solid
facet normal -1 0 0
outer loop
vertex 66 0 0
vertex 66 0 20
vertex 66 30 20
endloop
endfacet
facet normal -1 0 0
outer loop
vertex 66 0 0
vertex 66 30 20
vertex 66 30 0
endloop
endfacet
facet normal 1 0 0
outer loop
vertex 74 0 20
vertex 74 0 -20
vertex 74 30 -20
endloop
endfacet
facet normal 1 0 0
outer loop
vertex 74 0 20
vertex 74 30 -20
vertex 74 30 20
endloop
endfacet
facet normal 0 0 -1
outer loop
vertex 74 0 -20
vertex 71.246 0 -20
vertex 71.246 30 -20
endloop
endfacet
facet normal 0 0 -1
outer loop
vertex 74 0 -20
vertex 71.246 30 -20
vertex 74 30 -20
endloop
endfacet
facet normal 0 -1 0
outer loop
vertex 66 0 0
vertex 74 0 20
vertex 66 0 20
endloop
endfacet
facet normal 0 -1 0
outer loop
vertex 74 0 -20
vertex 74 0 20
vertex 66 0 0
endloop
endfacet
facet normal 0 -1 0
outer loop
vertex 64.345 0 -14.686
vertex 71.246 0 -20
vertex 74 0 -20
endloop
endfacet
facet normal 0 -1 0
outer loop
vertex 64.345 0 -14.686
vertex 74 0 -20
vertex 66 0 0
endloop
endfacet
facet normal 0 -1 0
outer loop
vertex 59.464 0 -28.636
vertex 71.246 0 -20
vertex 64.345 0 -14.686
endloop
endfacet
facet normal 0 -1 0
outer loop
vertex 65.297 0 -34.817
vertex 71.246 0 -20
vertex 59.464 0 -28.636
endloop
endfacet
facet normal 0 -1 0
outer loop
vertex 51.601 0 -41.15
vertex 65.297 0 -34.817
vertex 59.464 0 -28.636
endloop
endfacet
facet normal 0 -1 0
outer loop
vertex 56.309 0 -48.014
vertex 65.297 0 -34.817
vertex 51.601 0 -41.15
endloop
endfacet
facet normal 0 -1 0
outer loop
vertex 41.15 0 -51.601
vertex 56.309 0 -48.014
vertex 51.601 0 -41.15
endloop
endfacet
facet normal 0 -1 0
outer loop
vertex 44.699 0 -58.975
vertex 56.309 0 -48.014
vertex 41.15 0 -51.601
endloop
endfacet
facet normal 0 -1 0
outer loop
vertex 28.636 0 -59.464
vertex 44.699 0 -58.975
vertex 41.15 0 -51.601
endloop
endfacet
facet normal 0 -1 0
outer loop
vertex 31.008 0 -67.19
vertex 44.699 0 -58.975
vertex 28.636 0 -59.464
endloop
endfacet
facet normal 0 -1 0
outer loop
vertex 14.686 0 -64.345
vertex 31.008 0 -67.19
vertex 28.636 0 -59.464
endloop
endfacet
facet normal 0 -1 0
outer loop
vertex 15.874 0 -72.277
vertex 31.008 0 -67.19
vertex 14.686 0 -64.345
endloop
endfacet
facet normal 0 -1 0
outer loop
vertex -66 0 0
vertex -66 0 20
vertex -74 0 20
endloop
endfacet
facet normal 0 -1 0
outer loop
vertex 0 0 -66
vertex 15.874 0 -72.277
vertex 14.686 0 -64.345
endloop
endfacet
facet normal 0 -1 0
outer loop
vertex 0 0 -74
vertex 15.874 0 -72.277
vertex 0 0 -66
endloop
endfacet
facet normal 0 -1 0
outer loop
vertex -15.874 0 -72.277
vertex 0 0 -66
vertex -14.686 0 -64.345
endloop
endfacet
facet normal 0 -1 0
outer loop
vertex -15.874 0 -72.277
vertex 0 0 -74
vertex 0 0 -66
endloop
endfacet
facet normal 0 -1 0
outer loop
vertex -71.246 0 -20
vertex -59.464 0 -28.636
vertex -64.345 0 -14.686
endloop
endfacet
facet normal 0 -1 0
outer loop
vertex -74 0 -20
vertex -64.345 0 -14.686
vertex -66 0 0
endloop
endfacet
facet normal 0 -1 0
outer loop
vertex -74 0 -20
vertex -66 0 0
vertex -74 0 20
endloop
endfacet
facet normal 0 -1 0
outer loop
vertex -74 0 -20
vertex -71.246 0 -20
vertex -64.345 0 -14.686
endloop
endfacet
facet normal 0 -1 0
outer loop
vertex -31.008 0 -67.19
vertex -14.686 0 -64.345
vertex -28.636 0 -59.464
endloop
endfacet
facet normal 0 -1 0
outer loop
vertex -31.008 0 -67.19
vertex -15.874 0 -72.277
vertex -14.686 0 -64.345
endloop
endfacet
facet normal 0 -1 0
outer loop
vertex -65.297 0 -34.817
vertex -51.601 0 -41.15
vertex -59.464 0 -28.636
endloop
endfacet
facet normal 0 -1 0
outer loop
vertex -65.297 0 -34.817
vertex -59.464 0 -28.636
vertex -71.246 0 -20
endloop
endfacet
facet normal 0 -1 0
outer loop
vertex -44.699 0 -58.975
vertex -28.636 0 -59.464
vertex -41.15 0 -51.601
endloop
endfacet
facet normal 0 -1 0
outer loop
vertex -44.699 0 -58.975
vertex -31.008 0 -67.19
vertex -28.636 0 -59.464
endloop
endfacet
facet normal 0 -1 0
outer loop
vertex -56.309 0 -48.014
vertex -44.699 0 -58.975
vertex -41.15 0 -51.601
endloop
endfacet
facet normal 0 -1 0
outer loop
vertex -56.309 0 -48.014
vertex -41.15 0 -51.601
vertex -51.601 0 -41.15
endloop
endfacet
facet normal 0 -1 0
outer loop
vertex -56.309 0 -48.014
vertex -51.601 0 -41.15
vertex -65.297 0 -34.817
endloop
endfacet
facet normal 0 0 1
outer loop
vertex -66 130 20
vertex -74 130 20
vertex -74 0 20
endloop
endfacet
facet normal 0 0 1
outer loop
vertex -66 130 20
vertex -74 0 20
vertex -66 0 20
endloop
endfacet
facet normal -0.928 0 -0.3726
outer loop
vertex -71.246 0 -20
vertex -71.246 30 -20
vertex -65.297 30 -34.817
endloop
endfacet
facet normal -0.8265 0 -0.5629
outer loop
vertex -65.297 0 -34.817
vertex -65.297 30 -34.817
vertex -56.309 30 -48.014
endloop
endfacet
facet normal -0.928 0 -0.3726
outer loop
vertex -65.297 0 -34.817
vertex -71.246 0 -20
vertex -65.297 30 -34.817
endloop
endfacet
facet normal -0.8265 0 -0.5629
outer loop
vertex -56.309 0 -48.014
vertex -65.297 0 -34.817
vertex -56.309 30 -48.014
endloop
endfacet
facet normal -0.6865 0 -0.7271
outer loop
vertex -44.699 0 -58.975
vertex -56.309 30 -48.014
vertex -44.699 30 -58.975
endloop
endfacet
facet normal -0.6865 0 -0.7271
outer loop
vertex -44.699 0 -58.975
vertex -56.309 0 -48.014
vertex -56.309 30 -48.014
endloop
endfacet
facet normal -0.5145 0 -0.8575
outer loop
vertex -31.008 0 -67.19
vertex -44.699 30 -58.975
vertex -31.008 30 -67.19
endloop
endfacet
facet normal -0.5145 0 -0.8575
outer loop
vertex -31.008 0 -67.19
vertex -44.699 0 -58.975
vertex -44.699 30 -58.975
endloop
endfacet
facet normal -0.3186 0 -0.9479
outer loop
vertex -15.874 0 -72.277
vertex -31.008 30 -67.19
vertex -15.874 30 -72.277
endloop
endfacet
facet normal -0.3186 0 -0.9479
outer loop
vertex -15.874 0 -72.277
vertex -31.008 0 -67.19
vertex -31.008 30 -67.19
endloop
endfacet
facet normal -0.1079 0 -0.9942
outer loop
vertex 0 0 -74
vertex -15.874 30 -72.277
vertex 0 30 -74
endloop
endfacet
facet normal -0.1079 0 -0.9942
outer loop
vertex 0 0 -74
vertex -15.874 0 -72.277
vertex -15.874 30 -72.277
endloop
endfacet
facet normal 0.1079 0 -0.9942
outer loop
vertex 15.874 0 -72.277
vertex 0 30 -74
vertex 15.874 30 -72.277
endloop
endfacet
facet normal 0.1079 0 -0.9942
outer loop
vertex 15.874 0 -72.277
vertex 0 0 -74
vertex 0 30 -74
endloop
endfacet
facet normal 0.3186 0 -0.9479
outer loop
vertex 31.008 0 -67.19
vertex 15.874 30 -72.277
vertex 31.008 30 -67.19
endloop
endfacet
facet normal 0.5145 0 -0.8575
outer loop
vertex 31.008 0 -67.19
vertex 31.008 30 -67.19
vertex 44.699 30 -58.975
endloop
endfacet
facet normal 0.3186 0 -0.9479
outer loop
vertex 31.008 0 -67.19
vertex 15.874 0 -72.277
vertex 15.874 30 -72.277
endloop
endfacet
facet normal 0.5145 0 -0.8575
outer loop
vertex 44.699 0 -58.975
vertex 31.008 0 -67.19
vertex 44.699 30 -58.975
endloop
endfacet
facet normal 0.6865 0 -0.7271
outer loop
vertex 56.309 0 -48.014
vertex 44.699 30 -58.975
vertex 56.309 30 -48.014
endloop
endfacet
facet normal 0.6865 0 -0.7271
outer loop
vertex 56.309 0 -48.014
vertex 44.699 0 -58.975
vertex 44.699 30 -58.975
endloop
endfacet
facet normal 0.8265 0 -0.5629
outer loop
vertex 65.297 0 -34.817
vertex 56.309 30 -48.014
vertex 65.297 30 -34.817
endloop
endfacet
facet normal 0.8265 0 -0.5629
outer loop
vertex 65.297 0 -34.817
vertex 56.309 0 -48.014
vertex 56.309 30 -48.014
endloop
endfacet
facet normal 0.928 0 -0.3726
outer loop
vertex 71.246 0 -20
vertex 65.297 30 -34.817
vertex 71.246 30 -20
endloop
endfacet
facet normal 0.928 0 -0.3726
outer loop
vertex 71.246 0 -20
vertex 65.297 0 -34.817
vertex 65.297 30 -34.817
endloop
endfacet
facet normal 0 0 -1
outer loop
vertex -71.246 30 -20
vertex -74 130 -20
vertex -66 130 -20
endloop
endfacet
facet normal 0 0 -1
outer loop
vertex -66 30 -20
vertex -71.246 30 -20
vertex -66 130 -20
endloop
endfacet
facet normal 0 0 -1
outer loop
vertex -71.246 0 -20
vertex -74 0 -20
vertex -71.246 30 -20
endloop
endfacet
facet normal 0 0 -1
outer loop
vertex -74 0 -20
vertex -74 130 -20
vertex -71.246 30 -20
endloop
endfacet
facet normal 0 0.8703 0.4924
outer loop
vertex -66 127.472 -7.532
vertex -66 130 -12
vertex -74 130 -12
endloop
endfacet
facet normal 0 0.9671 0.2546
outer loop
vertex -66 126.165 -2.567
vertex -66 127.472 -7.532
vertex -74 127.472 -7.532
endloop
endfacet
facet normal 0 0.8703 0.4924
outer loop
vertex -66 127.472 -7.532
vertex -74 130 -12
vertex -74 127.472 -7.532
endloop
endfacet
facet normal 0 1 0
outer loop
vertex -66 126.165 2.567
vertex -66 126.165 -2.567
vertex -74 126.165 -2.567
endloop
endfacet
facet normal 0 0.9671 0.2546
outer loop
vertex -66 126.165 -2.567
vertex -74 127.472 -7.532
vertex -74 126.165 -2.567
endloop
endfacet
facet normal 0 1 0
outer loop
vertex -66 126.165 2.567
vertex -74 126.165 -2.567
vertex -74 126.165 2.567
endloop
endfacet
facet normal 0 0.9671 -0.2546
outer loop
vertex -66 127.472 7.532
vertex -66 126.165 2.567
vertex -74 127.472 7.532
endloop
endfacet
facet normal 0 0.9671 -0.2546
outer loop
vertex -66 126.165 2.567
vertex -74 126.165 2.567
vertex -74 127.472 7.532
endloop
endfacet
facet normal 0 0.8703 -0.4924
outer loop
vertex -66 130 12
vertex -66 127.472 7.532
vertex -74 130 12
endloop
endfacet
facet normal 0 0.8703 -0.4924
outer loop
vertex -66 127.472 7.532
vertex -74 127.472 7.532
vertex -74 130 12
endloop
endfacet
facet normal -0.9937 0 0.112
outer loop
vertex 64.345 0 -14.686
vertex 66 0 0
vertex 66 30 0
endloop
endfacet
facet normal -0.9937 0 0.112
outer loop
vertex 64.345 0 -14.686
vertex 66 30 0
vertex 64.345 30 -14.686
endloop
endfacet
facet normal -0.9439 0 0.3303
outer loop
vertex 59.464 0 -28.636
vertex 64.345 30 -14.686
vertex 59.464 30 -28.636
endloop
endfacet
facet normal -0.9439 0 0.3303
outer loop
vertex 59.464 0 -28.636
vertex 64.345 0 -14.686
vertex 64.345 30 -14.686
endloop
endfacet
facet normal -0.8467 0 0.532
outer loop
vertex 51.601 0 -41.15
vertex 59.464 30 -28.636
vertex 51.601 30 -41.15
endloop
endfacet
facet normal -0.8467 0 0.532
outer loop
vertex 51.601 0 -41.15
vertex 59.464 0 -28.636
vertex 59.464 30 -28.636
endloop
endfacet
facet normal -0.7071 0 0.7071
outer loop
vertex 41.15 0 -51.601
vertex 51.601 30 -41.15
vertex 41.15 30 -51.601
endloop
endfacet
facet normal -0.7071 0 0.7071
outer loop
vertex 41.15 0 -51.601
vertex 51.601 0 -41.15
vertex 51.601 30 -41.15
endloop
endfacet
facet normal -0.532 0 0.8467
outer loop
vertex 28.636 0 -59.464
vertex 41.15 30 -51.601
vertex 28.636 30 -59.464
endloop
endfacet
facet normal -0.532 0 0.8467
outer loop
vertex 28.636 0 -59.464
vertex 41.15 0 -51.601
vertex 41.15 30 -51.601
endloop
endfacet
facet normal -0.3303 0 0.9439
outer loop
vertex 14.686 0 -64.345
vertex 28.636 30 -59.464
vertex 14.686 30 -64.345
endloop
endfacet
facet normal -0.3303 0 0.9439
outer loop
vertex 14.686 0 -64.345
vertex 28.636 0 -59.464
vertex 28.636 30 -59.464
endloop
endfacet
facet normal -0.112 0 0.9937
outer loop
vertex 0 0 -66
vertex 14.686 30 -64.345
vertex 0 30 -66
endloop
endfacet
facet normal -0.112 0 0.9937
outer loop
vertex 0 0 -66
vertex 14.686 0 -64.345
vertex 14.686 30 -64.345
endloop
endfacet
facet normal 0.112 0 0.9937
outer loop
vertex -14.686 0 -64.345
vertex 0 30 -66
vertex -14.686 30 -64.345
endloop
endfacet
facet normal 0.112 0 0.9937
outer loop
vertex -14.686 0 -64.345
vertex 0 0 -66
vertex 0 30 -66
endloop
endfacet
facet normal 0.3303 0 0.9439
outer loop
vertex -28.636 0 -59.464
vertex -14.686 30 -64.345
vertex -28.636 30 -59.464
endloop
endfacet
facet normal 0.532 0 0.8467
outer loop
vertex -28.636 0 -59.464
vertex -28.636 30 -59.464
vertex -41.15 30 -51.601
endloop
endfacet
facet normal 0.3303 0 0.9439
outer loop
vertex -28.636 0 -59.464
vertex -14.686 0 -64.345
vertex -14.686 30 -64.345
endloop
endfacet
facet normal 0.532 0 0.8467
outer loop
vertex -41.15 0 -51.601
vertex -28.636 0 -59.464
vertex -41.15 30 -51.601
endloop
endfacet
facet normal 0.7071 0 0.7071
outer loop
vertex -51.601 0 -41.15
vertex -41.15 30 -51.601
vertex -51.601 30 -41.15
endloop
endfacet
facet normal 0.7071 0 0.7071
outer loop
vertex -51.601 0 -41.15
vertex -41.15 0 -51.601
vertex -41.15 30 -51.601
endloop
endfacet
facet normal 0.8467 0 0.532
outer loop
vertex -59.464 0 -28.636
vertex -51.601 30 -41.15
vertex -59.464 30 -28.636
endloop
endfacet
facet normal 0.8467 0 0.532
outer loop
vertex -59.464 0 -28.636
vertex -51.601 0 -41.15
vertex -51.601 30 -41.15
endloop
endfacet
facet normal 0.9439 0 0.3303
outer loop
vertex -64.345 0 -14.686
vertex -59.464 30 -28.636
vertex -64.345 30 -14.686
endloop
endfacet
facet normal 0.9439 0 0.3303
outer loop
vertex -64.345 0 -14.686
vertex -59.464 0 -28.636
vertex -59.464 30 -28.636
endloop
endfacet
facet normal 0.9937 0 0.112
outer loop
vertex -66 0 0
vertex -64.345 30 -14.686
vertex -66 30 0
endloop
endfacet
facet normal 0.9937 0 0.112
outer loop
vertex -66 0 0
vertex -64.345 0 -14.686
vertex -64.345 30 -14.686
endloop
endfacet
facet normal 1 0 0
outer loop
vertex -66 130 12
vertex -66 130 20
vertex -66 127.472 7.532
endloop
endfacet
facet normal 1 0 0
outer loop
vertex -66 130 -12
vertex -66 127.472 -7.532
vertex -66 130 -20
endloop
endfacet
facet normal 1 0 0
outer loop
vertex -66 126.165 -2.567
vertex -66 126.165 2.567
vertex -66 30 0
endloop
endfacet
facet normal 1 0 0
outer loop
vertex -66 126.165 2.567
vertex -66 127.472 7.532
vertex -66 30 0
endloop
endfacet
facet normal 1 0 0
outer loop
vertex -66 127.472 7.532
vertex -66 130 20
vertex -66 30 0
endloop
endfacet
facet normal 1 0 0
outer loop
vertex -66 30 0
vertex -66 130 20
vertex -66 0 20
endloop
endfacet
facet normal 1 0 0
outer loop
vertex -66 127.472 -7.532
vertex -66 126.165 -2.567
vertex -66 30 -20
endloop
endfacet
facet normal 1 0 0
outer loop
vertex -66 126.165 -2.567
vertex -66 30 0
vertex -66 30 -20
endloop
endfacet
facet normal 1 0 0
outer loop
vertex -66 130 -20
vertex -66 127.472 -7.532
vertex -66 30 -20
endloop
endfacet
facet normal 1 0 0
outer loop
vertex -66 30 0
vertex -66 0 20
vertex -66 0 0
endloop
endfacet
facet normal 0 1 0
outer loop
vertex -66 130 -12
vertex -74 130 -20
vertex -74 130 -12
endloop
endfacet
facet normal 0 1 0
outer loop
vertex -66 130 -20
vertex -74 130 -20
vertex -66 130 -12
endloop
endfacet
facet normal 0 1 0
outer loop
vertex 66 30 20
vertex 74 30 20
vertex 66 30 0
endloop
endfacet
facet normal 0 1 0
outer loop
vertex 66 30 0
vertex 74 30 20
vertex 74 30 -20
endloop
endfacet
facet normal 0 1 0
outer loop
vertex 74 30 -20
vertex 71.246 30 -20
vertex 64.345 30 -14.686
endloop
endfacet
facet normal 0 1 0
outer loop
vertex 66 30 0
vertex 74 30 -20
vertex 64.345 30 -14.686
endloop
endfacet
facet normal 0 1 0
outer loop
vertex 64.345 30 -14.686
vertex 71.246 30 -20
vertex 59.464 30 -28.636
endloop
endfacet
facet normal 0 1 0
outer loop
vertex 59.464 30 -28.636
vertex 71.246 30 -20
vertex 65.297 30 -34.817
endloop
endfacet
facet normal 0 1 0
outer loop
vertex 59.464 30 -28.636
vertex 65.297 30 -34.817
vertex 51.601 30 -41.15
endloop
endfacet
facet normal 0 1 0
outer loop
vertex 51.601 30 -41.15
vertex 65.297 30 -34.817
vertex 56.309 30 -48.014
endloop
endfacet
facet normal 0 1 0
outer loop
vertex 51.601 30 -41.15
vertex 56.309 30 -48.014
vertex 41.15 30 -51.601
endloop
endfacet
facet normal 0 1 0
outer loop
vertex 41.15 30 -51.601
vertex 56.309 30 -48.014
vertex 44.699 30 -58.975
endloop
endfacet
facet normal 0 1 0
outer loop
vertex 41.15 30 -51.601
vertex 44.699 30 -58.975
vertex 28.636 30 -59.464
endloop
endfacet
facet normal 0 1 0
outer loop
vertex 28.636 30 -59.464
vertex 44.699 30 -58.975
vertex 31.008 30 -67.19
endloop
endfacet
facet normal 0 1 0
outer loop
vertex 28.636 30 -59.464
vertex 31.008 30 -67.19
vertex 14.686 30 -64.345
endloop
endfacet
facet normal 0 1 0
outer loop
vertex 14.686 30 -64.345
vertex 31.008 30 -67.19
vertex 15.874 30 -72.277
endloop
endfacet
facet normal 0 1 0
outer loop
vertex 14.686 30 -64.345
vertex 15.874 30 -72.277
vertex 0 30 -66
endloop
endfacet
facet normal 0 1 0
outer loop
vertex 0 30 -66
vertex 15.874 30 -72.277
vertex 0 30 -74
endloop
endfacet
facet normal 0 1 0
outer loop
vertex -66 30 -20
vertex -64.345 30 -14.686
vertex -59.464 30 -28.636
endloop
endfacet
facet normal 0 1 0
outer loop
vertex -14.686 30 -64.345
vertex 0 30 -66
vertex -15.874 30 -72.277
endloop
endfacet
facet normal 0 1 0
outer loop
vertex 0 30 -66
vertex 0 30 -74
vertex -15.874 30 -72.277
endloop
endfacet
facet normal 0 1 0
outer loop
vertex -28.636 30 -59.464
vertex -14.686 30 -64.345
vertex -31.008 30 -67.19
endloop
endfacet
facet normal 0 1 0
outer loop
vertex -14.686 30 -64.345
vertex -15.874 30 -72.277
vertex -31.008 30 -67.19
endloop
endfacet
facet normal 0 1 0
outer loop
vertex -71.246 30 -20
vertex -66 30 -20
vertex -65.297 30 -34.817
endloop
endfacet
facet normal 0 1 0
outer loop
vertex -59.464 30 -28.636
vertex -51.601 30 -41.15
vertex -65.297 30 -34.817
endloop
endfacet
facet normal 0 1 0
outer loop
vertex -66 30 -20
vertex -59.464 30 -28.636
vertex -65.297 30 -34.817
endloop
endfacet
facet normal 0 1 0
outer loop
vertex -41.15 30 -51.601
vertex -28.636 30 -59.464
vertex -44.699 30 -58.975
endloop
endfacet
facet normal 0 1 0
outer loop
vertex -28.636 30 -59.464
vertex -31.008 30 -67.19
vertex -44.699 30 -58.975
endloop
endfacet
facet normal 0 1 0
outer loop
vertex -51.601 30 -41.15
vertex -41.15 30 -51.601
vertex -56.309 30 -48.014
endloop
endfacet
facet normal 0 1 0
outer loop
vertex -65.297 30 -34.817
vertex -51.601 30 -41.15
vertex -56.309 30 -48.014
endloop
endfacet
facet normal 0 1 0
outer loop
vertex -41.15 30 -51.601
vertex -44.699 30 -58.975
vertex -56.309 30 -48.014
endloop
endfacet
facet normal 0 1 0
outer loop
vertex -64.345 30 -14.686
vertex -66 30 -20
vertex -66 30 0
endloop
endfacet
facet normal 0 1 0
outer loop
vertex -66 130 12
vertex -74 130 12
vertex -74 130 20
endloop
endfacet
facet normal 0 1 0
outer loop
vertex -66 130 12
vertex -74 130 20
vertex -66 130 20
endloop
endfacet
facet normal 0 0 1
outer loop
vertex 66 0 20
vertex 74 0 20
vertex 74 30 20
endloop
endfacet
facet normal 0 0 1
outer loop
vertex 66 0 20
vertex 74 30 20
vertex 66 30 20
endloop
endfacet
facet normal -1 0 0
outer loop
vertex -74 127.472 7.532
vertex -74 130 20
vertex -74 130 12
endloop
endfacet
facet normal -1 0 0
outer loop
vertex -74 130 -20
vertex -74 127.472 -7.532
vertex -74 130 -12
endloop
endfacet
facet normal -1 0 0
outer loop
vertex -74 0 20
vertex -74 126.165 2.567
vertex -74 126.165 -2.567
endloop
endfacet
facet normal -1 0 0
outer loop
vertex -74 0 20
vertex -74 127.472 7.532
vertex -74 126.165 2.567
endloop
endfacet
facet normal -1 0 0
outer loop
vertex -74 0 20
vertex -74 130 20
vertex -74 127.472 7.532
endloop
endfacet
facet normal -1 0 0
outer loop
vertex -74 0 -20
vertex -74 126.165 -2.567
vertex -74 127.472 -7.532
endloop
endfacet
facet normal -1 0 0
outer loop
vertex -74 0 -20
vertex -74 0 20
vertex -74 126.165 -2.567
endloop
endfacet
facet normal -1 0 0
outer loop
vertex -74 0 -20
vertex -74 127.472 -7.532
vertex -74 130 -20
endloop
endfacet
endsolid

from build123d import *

# Parameters (mm, degrees)
EXTRUDE_1_DEPTH     = 30
SKETCH_2_W          = 8
SKETCH_2_H          = 40
EXTRUDE_2_DEPTH     = 100
SKETCH_3_R          = 20
CUT_EXTRUDE_1_DEPTH = 211.428135001
SKETCH_5_W          = 87.00766185
SKETCH_5_H          = 105.192301749
CUT_EXTRUDE_2_DEPTH = 10


with BuildPart() as part:
    # 草图1 → 凸台-拉伸1 (new body)
    with BuildSketch(Plane(origin=(0, 0, 0), x_dir=(1, 0, 0), z_dir=(0, 1, 0))):
        with BuildLine():
            Line((-74, 20), (-71.246052522, 20))
            ThreePointArc((-71.246052522, 20), (0, 74), (71.246052522, 20))
            Line((71.246052522, 20), (74, 20))
            Line((74, 20), (74, -20))
            Line((74, -20), (66, -20))
            Line((66, -20), (66, 0))
            ThreePointArc((66, 0), (0, 66), (-66, 0))
            Line((-66, 0), (-66, -20))
            Line((-66, -20), (-74, -20))
            Line((-74, -20), (-74, 20))
        make_face()
    extrude(amount=EXTRUDE_1_DEPTH)

    # 草图2 → 凸台-拉伸2 (add)
    with BuildSketch(Plane(origin=(0, 30, 0), x_dir=(1, 0, 0), z_dir=(0, 1, 0))):
        with Locations((-70, 0)):
            Rectangle(SKETCH_2_W, SKETCH_2_H)
        with Locations((70, 0)):
            Rectangle(SKETCH_2_W, SKETCH_2_H)
    extrude(amount=EXTRUDE_2_DEPTH)

    # 草图3 → 切除-拉伸1 (cut, through all)
    with BuildSketch(Plane.ZY.offset(74)):
        with Locations((0, 146)):
            Circle(SKETCH_3_R)
    extrude(amount=-CUT_EXTRUDE_1_DEPTH, mode=Mode.SUBTRACT)

    # 草图5 → 切除-拉伸2 (cut)
    with BuildSketch(Plane(origin=(74, 0, 0), x_dir=(0, 0, -1), z_dir=(1, 0, 0))):
        with Locations((-23.503830925, 82.596150874)):
            Rectangle(SKETCH_5_W, SKETCH_5_H)
    extrude(amount=-CUT_EXTRUDE_2_DEPTH, mode=Mode.SUBTRACT)


solid = part.part
